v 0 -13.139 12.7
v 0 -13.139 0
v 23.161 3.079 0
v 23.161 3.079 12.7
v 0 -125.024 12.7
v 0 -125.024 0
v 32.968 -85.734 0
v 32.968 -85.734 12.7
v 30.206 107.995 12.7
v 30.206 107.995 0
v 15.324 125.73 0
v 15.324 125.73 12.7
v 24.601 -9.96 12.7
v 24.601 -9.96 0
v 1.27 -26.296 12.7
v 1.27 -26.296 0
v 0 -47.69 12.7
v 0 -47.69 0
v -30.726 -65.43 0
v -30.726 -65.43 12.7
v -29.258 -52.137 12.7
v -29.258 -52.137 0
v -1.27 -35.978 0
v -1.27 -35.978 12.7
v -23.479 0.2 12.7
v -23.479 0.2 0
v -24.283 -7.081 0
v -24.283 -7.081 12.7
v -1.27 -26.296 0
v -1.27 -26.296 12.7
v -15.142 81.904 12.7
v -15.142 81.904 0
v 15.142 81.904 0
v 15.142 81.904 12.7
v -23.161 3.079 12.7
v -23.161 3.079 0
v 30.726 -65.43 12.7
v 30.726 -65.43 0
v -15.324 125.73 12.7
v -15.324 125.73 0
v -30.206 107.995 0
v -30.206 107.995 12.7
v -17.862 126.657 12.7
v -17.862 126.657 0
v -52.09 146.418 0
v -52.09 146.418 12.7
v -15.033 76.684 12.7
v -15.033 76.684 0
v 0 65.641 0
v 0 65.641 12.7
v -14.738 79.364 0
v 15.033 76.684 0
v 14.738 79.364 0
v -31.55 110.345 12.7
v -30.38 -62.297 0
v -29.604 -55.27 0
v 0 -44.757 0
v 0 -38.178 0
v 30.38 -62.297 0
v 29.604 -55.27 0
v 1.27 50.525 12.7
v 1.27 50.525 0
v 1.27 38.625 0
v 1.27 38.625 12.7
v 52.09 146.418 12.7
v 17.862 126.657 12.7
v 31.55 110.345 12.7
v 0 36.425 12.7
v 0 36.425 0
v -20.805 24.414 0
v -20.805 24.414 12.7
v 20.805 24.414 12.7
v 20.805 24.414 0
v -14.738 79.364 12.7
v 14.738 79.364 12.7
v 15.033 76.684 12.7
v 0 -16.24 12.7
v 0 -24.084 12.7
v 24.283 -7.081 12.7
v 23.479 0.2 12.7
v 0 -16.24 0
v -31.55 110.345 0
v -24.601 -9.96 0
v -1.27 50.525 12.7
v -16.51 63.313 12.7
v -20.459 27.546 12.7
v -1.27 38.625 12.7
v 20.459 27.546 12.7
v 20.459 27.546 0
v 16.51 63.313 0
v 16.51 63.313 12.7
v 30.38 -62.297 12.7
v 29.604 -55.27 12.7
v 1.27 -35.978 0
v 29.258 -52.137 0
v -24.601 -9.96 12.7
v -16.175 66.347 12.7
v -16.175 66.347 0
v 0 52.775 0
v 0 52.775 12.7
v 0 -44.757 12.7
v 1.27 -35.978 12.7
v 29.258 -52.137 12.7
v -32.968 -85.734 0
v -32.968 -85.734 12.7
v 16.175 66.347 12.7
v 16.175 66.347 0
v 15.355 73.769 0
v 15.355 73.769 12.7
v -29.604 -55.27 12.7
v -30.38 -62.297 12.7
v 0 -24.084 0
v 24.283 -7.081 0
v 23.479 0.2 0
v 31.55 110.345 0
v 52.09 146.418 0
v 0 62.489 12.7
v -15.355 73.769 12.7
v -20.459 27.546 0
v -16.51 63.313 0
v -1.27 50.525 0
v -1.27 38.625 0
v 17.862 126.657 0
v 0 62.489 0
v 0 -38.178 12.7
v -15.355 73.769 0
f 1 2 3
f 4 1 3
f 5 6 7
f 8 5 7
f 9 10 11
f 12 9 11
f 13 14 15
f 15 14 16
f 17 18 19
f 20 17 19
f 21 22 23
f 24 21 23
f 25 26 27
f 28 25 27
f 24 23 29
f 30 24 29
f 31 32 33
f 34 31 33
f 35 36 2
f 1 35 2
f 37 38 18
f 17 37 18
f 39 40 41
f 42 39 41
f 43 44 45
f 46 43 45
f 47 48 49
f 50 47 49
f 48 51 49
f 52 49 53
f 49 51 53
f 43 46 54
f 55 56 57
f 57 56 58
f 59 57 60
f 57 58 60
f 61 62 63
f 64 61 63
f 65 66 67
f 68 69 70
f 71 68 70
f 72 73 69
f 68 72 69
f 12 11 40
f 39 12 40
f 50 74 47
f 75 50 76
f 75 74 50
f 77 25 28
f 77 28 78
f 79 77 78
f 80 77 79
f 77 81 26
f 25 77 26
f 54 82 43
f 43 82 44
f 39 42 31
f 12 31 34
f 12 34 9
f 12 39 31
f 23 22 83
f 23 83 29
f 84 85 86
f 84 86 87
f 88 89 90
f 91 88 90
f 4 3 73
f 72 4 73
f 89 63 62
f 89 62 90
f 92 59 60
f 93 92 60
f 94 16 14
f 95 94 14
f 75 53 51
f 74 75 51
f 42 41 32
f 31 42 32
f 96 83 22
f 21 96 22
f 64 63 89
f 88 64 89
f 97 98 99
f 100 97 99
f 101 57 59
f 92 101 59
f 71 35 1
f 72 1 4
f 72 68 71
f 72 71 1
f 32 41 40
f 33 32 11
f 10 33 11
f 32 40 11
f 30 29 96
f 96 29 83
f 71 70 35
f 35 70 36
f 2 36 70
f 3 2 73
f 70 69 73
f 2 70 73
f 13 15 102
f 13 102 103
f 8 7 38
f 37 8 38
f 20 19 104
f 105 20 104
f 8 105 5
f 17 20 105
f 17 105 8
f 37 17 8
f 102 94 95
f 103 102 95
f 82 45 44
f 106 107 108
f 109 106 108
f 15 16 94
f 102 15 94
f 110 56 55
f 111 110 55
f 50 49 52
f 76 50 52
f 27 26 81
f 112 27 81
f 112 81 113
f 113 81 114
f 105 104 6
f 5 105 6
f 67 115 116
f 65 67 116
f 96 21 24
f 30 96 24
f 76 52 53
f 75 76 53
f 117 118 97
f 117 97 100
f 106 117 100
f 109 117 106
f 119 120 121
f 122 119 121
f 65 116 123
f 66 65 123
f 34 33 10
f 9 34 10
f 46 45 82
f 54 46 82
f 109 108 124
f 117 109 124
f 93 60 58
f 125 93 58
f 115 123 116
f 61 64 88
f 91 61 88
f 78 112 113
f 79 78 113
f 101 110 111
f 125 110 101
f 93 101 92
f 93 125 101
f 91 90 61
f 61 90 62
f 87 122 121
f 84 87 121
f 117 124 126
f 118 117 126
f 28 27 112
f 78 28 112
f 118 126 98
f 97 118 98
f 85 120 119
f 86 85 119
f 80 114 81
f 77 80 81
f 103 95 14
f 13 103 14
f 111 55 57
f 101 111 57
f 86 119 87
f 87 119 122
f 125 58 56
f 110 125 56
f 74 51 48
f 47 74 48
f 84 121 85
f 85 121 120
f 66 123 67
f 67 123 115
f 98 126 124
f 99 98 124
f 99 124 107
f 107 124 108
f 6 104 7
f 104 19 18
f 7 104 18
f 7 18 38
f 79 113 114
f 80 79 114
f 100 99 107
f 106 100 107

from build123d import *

# Parameters (mm, degrees)
BOSS_EXTRUDE1_DEPTH    = 12.7
BOSS_EXTRUDE1_2_DEPTH  = 12.7
BOSS_EXTRUDE1_3_DEPTH  = 12.7
BOSS_EXTRUDE1_4_DEPTH  = 12.7
BOSS_EXTRUDE1_5_DEPTH  = 12.7
BOSS_EXTRUDE1_6_DEPTH  = 12.7
BOSS_EXTRUDE1_7_DEPTH  = 12.7
BOSS_EXTRUDE1_8_DEPTH  = 12.7
BOSS_EXTRUDE1_9_DEPTH  = 12.7
BOSS_EXTRUDE1_10_DEPTH = 12.7
BOSS_EXTRUDE1_11_DEPTH = 12.7
BOSS_EXTRUDE1_12_DEPTH = 12.7
BOSS_EXTRUDE1_13_DEPTH = 12.7


with BuildPart() as part:
    # Offset_Pieces → Boss-Extrude1 (new body)
    with BuildSketch(Plane.XY):
        Polygon((-52.089952502, 146.418323379), (-31.549571397, 110.344916612), (-17.862182697, 126.656911268), align=None)
    extrude(amount=BOSS_EXTRUDE1_DEPTH)


with BuildPart() as body_2:
    # Offset_Pieces → Boss-Extrude1 2 (new body)
    with BuildSketch(Plane.XY):
        Polygon((15.033405216, 76.684377521), (14.737517247, 79.363979274), (-14.737517247, 79.363979274), (-15.033405216, 76.684377521), (0, 65.640755559), align=None)
    extrude(amount=BOSS_EXTRUDE1_2_DEPTH)


with BuildPart() as body_3:
    # Offset_Pieces → Boss-Extrude1 3 (new body)
    with BuildSketch(Plane.XY):
        Polygon((-15.141765158, 81.903979274), (15.141765158, 81.903979274), (30.20551595, 107.995160999), (15.324219086, 125.73), (-15.324219086, 125.73), (-30.20551595, 107.995160999), align=None)
    extrude(amount=BOSS_EXTRUDE1_3_DEPTH)


with BuildPart() as body_4:
    # Offset_Pieces → Boss-Extrude1 4 (new body)
    with BuildSketch(Plane.XY):
        Polygon((31.549571397, 110.344916612), (52.089952502, 146.418323379), (17.862182697, 126.656911268), align=None)
    extrude(amount=BOSS_EXTRUDE1_4_DEPTH)


with BuildPart() as body_5:
    # Offset_Pieces → Boss-Extrude1 5 (new body)
    with BuildSketch(Plane.XY):
        Polygon((15.355310757, 73.769157091), (0, 62.489061552), (-15.355310757, 73.769157091), (-16.174863317, 66.347177466), (0, 52.774855623), (16.174863317, 66.347177466), align=None)
    extrude(amount=BOSS_EXTRUDE1_5_DEPTH)


with BuildPart() as body_6:
    # Offset_Pieces → Boss-Extrude1 6 (new body)
    with BuildSketch(Plane.XY):
        Polygon((20.459364211, 27.546153708), (16.509947246, 63.312611753), (1.27, 50.52477764), (1.27, 38.625138301), align=None)
    extrude(amount=BOSS_EXTRUDE1_6_DEPTH)


with BuildPart() as body_7:
    # Offset_Pieces → Boss-Extrude1 7 (new body)
    with BuildSketch(Plane.XY):
        Polygon((-1.27, 50.52477764), (-16.509947246, 63.312611753), (-20.459364211, 27.546153708), (-1.27, 38.625138301), align=None)
    extrude(amount=BOSS_EXTRUDE1_7_DEPTH)


with BuildPart() as body_8:
    # Offset_Pieces → Boss-Extrude1 8 (new body)
    with BuildSketch(Plane.XY):
        Polygon((0, -13.138928754), (23.161122376, 3.078663726), (20.805279226, 24.413500214), (0, 36.425433775), (-20.805279226, 24.413500214), (-23.161122376, 3.078663726), align=None)
    extrude(amount=BOSS_EXTRUDE1_8_DEPTH)


with BuildPart() as body_9:
    # Offset_Pieces → Boss-Extrude1 9 (new body)
    with BuildSketch(Plane.XY):
        Polygon((24.283013627, -7.081336274), (23.478943019, 0.200436681), (0, -16.23969621), (-23.478943019, 0.200436681), (-24.283013627, -7.081336274), (0, -24.084485466), align=None)
    extrude(amount=BOSS_EXTRUDE1_9_DEPTH)


with BuildPart() as body_10:
    # Offset_Pieces → Boss-Extrude1 10 (new body)
    with BuildSketch(Plane.XY):
        Polygon((-24.60083427, -9.959563319), (-29.258182314, -52.137141647), (-1.27, -35.978157054), (-1.27, -26.295989347), align=None)
    extrude(amount=BOSS_EXTRUDE1_10_DEPTH)


with BuildPart() as body_11:
    # Offset_Pieces → Boss-Extrude1 11 (new body)
    with BuildSketch(Plane.XY):
        Polygon((1.27, -26.295989347), (1.27, -35.978157054), (29.258182314, -52.137141647), (24.60083427, -9.959563319), align=None)
    extrude(amount=BOSS_EXTRUDE1_11_DEPTH)


with BuildPart() as body_12:
    # Offset_Pieces → Boss-Extrude1 12 (new body)
    with BuildSketch(Plane.XY):
        Polygon((30.380073565, -62.297141647), (29.604097328, -55.269795142), (0, -38.17786158), (-29.604097328, -55.269795142), (-30.380073565, -62.297141647), (0, -44.757197997), align=None)
    extrude(amount=BOSS_EXTRUDE1_12_DEPTH)


with BuildPart() as body_13:
    # Offset_Pieces → Boss-Extrude1 13 (new body)
    with BuildSketch(Plane.XY):
        Polygon((-30.72598858, -65.429795142), (-32.968072436, -85.734411973), (0, -125.02423074), (32.968072436, -85.734411973), (30.72598858, -65.429795142), (0, -47.690137364), align=None)
    extrude(amount=BOSS_EXTRUDE1_13_DEPTH)


solid = Compound([part.part, body_2.part, body_3.part, body_4.part, body_5.part, body_6.part, body_7.part, body_8.part, body_9.part, body_10.part, body_11.part, body_12.part, body_13.part])
